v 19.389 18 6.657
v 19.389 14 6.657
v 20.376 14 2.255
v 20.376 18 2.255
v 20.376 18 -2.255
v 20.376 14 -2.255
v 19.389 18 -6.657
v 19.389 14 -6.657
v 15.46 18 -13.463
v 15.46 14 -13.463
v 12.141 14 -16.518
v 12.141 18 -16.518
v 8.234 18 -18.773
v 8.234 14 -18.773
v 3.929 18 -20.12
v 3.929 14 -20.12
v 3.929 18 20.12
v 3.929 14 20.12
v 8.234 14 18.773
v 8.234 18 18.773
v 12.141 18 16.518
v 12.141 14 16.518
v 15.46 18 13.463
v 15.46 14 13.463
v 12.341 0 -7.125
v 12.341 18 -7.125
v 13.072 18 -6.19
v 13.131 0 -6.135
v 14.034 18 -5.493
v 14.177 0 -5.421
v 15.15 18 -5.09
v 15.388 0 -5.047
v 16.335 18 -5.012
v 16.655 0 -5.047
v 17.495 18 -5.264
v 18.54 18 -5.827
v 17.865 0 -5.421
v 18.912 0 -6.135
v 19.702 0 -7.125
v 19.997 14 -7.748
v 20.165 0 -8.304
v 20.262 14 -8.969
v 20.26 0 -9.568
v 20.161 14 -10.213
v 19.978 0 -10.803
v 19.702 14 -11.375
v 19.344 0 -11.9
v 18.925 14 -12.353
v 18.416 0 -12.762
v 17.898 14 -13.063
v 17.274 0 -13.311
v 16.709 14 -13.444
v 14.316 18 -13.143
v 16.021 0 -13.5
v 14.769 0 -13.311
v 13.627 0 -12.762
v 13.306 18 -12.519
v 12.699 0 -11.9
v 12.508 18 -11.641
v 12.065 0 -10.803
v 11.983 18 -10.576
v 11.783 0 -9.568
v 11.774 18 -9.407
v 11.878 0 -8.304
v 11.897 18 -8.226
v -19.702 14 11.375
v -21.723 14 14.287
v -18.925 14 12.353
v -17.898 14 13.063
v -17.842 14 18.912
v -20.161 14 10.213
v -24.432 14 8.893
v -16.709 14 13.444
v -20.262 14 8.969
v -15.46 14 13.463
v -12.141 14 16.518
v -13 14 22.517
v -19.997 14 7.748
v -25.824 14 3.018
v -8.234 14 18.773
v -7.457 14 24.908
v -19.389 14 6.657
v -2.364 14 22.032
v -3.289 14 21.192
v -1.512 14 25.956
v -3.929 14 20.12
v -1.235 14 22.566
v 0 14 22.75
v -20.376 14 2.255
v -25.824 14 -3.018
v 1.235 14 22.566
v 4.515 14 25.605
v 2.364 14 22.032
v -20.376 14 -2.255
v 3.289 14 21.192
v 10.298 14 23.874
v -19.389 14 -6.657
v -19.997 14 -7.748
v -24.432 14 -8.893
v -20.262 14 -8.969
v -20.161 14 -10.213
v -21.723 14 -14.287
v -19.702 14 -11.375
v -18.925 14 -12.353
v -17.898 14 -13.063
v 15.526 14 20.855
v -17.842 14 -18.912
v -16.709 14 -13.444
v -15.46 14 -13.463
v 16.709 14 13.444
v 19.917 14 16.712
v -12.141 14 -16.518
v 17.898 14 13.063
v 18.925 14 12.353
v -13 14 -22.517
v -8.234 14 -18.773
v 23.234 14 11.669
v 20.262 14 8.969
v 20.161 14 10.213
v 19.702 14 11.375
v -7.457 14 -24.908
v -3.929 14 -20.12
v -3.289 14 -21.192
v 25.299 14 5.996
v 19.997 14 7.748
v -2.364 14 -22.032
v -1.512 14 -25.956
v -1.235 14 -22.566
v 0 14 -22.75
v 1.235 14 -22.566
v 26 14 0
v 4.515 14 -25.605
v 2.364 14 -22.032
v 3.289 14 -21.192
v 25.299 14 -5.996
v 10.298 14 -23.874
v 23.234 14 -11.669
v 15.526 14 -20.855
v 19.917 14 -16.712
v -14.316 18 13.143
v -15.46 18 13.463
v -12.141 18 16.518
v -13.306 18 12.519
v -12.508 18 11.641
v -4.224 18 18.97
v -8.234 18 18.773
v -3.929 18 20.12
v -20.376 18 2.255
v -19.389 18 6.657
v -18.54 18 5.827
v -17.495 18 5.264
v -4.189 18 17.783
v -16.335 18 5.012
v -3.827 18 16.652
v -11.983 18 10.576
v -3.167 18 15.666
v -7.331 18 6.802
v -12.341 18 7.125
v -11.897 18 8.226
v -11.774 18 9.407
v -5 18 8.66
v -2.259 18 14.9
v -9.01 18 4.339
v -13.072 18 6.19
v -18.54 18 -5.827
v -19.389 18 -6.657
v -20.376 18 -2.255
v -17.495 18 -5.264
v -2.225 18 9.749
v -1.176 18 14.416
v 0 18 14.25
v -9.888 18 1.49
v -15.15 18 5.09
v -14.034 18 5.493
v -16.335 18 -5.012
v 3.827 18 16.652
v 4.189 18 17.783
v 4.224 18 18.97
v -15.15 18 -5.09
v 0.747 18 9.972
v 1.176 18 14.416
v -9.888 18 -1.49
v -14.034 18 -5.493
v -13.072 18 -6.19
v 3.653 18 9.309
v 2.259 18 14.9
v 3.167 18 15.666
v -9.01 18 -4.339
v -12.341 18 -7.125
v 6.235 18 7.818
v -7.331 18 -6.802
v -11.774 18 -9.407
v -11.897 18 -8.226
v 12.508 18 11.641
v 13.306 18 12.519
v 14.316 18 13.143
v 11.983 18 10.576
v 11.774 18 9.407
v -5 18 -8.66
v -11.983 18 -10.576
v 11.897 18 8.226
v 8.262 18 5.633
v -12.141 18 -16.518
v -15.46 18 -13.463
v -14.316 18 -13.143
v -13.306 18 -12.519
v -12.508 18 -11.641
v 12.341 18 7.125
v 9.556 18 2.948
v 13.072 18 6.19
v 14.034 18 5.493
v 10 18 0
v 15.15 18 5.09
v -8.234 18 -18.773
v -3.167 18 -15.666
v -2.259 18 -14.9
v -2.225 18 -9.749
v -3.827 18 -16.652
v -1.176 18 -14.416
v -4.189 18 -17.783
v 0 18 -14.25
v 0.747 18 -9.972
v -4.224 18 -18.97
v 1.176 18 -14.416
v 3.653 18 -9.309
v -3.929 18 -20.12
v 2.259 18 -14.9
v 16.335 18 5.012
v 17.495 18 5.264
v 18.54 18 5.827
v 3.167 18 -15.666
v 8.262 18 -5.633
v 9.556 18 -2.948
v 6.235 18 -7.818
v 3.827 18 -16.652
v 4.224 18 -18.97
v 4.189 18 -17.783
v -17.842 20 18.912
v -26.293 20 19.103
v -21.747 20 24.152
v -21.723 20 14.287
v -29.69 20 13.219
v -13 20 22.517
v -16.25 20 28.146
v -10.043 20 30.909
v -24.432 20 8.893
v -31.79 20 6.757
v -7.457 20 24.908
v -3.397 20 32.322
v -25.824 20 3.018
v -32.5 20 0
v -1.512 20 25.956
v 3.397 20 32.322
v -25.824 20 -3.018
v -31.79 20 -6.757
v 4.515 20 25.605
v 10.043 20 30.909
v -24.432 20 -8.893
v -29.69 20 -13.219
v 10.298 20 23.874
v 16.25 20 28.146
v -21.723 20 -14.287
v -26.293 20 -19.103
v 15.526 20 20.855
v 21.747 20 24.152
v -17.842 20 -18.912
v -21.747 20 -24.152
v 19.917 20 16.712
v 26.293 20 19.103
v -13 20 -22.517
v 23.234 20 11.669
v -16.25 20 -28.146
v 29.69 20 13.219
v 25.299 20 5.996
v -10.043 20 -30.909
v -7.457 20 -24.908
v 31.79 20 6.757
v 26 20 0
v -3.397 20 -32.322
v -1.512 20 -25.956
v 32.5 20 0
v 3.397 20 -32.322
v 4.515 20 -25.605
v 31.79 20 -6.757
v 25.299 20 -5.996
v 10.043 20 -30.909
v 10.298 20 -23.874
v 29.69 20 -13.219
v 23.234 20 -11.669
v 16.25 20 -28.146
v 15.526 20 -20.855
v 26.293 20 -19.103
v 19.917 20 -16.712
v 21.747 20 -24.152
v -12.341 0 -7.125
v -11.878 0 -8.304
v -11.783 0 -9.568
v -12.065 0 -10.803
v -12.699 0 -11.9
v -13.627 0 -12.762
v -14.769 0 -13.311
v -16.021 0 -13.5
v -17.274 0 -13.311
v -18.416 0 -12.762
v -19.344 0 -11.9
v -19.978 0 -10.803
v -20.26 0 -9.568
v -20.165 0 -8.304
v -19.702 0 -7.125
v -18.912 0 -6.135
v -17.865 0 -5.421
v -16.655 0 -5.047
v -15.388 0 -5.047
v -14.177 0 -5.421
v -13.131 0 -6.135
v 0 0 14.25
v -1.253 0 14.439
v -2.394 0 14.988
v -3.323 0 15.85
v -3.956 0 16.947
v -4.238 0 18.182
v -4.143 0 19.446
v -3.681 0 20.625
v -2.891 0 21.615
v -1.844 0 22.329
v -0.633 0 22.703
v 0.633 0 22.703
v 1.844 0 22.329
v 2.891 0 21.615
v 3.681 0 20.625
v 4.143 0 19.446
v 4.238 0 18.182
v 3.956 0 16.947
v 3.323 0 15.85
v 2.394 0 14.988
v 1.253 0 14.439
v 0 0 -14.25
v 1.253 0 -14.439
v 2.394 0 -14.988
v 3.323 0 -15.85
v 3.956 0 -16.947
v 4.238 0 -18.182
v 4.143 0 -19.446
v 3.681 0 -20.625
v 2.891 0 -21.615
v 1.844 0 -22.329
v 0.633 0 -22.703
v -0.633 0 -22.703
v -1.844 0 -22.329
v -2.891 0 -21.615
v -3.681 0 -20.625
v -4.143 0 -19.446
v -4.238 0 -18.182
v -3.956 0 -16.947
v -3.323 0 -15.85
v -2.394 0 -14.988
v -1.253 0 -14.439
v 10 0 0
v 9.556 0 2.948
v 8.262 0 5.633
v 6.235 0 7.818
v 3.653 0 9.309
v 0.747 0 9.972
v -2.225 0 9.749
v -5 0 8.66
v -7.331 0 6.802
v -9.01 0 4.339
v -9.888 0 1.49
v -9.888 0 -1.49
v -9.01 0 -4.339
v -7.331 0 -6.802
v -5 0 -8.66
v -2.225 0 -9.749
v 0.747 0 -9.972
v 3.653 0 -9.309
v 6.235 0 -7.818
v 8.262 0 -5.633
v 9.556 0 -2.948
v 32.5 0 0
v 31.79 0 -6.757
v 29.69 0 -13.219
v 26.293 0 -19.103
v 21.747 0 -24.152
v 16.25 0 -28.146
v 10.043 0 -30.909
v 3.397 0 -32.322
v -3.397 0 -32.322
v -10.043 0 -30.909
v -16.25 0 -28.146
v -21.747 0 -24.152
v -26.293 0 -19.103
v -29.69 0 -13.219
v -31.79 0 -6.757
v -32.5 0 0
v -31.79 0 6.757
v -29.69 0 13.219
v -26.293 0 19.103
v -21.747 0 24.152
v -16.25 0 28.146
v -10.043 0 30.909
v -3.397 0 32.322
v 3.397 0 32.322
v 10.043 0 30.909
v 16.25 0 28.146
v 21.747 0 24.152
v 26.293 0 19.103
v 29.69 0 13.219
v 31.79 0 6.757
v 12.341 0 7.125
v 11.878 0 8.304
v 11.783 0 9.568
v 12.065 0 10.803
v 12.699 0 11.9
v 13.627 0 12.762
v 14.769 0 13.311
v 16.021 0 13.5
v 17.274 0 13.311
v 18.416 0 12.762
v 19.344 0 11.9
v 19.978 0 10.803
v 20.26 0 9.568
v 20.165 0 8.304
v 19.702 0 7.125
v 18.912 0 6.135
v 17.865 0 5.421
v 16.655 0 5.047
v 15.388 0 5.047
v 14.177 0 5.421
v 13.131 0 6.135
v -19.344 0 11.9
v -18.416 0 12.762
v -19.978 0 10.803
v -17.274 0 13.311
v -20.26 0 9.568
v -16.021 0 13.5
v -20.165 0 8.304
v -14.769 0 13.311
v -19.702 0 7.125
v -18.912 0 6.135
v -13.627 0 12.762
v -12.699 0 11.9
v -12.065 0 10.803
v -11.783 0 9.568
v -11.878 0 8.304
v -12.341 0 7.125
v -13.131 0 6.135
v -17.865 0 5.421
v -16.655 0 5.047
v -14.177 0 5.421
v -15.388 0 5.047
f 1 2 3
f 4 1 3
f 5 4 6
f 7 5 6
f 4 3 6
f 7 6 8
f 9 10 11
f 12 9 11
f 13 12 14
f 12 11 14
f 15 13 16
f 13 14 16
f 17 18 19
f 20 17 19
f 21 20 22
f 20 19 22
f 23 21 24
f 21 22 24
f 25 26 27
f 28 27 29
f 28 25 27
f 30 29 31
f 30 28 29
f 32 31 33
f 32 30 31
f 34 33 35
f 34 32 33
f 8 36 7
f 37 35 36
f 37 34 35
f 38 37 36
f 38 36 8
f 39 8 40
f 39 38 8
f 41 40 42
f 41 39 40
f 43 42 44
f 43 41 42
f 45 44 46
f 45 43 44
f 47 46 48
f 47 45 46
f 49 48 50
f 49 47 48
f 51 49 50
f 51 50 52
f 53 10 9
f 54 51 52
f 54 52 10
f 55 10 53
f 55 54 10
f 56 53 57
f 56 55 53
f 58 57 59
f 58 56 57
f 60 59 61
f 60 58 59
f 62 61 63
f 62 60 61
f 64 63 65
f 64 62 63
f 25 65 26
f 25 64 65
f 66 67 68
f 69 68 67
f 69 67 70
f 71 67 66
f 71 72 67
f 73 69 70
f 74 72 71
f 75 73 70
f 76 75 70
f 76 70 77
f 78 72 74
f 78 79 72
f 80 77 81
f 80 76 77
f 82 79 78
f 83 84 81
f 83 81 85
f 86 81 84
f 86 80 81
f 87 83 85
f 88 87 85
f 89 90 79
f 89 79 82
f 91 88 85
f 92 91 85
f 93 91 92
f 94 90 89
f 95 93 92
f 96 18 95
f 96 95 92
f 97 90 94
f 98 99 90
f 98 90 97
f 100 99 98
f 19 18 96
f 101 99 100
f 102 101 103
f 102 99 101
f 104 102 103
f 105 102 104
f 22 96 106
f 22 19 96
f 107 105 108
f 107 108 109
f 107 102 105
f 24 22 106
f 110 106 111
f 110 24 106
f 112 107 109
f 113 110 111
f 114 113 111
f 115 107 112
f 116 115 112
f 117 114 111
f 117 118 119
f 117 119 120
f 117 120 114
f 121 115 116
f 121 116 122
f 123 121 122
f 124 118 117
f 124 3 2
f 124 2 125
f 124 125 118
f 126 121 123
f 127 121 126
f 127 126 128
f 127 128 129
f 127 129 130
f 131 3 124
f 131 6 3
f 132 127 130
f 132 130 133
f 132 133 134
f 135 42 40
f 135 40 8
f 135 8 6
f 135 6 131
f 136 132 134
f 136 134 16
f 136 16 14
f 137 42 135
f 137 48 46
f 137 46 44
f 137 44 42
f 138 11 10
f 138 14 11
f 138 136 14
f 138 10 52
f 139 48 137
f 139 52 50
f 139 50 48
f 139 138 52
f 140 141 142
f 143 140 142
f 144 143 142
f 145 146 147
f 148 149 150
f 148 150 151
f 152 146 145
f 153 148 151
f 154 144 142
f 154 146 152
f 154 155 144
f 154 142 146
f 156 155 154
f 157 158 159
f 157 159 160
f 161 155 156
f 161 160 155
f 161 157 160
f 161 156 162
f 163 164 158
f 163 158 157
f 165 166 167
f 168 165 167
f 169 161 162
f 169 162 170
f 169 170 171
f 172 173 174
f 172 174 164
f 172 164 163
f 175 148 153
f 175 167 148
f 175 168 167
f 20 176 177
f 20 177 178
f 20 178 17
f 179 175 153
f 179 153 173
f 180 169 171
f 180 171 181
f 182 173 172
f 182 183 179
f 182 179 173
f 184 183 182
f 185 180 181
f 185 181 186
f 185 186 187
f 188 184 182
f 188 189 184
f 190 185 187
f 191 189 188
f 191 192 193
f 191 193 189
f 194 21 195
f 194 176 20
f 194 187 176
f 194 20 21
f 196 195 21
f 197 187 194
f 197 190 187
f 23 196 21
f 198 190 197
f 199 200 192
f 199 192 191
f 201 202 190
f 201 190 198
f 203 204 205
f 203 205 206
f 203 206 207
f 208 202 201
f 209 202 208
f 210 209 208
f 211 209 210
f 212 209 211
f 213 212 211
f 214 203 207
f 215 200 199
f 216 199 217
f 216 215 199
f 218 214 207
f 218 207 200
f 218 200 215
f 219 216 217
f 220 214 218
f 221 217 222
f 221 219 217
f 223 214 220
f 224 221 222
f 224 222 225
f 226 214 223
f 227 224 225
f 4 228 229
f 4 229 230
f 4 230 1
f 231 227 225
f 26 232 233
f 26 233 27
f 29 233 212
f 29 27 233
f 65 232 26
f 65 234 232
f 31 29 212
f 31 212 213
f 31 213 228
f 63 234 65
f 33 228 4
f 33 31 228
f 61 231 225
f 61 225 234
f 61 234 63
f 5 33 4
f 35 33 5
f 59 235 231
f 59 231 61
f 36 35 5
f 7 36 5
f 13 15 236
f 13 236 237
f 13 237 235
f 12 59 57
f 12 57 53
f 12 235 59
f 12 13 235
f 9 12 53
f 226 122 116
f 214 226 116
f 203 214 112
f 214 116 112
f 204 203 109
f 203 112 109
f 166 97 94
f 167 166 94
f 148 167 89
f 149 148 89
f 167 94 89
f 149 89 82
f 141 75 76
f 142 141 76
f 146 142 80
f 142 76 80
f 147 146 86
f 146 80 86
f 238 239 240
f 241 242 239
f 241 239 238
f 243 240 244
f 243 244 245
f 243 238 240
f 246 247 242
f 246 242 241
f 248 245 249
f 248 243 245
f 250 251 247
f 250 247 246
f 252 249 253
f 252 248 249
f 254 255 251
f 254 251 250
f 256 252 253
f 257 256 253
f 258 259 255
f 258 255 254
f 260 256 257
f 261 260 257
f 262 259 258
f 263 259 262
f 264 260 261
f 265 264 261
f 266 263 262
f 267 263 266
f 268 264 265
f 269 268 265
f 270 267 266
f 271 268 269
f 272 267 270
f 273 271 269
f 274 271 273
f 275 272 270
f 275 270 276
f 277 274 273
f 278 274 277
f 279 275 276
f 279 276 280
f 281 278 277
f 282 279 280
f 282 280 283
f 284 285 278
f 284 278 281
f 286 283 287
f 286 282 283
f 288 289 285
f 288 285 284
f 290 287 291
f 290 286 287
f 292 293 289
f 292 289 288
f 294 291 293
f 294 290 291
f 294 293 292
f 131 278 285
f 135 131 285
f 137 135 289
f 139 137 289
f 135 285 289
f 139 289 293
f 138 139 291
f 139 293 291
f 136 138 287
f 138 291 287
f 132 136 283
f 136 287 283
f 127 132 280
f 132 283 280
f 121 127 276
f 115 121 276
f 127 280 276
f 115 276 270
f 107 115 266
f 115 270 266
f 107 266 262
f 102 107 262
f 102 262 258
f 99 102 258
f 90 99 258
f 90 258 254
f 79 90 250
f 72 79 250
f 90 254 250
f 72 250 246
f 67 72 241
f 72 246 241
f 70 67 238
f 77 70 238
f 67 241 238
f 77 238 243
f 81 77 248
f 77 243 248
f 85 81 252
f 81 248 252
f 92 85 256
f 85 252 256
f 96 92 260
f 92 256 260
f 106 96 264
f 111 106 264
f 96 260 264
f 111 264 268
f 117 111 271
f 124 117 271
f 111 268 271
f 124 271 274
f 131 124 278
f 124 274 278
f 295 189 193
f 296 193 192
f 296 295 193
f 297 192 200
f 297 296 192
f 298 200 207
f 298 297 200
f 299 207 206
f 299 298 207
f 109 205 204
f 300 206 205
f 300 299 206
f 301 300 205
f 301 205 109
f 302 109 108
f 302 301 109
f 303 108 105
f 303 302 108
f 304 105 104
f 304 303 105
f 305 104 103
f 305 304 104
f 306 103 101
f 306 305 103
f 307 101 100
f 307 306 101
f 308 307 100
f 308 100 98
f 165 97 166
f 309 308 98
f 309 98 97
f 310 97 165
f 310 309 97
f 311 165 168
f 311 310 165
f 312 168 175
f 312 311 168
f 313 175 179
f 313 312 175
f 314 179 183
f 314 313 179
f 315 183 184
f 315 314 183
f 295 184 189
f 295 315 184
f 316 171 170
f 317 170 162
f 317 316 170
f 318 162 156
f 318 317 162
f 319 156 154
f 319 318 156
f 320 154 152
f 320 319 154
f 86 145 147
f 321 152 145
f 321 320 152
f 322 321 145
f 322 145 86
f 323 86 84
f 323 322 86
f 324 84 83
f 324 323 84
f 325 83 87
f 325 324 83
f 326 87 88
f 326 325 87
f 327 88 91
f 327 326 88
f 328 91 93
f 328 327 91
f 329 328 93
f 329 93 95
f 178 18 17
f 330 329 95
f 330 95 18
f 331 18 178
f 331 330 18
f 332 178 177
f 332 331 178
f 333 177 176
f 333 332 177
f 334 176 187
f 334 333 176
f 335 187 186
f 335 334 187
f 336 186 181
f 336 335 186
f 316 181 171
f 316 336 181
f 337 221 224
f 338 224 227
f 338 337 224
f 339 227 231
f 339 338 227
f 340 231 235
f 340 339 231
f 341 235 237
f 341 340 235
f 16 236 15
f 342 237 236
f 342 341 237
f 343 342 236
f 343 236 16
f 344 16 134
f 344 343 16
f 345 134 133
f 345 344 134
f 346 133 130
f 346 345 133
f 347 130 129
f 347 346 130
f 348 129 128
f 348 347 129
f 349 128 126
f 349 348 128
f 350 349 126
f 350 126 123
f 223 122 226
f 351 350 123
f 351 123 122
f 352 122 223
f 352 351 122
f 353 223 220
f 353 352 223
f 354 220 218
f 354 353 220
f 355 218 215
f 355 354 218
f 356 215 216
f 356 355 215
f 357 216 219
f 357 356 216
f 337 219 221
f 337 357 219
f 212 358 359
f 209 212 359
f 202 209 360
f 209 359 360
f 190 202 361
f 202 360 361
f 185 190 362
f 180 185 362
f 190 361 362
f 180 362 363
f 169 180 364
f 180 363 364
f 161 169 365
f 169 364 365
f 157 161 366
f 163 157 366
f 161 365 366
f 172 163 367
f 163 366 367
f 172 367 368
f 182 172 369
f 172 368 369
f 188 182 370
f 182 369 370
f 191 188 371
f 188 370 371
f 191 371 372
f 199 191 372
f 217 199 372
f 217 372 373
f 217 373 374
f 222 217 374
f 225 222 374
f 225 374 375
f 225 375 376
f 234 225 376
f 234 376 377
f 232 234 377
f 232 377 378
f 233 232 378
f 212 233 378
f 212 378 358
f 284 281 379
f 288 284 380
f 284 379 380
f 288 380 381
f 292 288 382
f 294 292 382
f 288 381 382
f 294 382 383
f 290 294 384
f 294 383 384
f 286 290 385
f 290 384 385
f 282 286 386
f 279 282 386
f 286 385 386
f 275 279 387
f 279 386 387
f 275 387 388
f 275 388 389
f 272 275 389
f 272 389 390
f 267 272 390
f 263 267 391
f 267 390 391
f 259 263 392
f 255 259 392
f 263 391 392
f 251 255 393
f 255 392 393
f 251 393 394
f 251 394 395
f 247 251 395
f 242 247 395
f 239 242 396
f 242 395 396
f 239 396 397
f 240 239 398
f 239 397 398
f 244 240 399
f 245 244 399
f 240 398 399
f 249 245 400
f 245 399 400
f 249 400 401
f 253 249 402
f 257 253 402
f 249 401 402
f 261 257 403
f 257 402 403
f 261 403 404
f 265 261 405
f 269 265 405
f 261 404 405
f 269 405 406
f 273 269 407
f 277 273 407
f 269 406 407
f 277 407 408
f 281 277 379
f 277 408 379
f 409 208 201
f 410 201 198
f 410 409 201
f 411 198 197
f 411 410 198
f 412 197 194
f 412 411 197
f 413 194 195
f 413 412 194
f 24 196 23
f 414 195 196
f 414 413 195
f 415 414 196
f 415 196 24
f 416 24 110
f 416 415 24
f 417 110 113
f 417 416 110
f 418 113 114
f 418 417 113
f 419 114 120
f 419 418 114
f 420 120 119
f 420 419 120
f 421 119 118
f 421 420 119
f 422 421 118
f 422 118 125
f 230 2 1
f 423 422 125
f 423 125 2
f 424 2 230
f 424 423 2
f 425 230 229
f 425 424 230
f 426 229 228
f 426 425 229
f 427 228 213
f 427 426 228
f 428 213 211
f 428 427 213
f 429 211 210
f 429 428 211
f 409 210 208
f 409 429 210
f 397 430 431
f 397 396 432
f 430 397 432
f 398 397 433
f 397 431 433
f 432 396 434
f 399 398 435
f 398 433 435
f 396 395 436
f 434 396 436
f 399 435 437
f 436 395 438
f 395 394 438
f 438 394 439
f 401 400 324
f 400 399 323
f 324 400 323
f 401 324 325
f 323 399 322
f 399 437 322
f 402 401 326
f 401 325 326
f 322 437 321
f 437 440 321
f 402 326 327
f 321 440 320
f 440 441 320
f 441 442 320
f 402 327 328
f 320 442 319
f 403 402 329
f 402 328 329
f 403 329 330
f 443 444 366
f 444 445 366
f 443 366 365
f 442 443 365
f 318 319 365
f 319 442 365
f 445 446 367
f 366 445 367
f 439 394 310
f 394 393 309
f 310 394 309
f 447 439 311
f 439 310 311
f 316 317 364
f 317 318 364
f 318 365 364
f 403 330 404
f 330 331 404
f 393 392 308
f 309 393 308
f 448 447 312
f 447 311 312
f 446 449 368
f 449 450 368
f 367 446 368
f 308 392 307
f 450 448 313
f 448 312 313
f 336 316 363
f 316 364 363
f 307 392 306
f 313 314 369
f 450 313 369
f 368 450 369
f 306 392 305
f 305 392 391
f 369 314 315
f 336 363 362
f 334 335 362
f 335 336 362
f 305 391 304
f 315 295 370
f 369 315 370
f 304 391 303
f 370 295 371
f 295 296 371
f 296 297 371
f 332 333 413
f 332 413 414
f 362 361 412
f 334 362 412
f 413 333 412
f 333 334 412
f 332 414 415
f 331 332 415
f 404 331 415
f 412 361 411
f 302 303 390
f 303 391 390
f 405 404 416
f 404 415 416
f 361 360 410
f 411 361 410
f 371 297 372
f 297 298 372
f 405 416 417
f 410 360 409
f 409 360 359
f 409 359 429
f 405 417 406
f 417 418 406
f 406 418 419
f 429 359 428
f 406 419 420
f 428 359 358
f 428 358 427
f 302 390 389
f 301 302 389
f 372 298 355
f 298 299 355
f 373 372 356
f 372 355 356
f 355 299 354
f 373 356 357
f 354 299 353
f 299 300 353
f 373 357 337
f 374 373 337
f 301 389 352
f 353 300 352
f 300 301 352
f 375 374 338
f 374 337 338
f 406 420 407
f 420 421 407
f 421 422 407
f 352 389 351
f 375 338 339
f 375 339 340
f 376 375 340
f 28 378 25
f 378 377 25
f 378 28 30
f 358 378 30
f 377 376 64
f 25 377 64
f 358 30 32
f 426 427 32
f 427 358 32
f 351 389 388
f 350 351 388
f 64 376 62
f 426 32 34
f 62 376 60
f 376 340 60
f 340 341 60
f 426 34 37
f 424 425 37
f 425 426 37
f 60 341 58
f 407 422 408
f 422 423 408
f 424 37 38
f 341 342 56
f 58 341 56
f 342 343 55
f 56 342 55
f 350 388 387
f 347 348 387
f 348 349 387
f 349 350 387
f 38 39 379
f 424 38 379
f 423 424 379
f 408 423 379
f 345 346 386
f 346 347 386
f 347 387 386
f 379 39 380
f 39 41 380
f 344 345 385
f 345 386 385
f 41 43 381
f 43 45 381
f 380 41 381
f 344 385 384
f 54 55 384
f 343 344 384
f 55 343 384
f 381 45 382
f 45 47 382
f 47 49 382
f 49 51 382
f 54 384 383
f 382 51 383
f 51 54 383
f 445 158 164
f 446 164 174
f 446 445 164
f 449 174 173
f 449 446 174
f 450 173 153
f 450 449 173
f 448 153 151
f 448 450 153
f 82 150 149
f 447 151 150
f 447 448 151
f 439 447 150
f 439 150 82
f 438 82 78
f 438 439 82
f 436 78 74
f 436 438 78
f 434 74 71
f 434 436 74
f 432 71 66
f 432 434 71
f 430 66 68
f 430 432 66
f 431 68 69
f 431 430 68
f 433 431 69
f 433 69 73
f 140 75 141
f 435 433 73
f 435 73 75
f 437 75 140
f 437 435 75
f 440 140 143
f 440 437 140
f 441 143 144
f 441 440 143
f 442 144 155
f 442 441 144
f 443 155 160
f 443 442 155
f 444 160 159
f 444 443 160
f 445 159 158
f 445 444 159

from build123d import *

# Parameters (mm, degrees)
SKETCH1_R           = 32.5
BOSS_EXTRUDE1_DEPTH = 20
SKETCH2_R           = 26
CUT_EXTRUDE1_DEPTH  = 6
SKETCH3_R           = 20.5
BOSS_EXTRUDE2_DEPTH = 4
SKETCH8_R           = 10
CUT_EXTRUDE2_DEPTH  = 21
CIRPATTERN1_COUNT   = 6


with BuildPart() as part:
    # Sketch1 → Boss-Extrude1 (new body)
    with BuildSketch(Plane(origin=(0, 0, 0), x_dir=(1, 0, 0), z_dir=(0, 1, 0))):
        Circle(SKETCH1_R)
    extrude(amount=BOSS_EXTRUDE1_DEPTH)

    # Sketch2 → Cut-Extrude1 (cut)
    with BuildSketch(Plane(origin=(0, 20, 0), x_dir=(1, 0, 0), z_dir=(0, 1, 0))):
        Circle(SKETCH2_R)
    extrude(amount=-CUT_EXTRUDE1_DEPTH, mode=Mode.SUBTRACT)

    # Sketch3 → Boss-Extrude2 (add)
    with BuildSketch(Plane(origin=(0, 14, 0), x_dir=(1, 0, 0), z_dir=(0, 1, 0))):
        Circle(SKETCH3_R)
    extrude(amount=BOSS_EXTRUDE2_DEPTH)

    # Sketch6 → M10 Tapped Hole1 (revolve, cut)
    with BuildSketch(Plane(origin=(0, 0, 18.5), x_dir=(0, 0, -1), z_dir=(1, 0, 0))):
        Polygon((0, 0), (0, 37.053657631), (4.25, 34.5), (4.25, 0), align=None)
    m10_tapped_hole1 = revolve(axis=Axis((0, -6.35, 18.5), (0, 1, 0)), mode=Mode.SUBTRACT)

    # Sketch8 → Cut-Extrude2 (cut, through all)
    with BuildSketch(Plane.XZ):
        Circle(SKETCH8_R)
    extrude(amount=-CUT_EXTRUDE2_DEPTH, mode=Mode.SUBTRACT)

    # CirPattern1: M10 Tapped Hole1 ×6 about axis
    cirpattern1_axis = Axis((0, 0, 0), (0, 1, 0))
    for i in range(1, CIRPATTERN1_COUNT):
        add(m10_tapped_hole1.rotate(cirpattern1_axis, i * 360 / CIRPATTERN1_COUNT), mode=Mode.SUBTRACT)


solid = part.part
